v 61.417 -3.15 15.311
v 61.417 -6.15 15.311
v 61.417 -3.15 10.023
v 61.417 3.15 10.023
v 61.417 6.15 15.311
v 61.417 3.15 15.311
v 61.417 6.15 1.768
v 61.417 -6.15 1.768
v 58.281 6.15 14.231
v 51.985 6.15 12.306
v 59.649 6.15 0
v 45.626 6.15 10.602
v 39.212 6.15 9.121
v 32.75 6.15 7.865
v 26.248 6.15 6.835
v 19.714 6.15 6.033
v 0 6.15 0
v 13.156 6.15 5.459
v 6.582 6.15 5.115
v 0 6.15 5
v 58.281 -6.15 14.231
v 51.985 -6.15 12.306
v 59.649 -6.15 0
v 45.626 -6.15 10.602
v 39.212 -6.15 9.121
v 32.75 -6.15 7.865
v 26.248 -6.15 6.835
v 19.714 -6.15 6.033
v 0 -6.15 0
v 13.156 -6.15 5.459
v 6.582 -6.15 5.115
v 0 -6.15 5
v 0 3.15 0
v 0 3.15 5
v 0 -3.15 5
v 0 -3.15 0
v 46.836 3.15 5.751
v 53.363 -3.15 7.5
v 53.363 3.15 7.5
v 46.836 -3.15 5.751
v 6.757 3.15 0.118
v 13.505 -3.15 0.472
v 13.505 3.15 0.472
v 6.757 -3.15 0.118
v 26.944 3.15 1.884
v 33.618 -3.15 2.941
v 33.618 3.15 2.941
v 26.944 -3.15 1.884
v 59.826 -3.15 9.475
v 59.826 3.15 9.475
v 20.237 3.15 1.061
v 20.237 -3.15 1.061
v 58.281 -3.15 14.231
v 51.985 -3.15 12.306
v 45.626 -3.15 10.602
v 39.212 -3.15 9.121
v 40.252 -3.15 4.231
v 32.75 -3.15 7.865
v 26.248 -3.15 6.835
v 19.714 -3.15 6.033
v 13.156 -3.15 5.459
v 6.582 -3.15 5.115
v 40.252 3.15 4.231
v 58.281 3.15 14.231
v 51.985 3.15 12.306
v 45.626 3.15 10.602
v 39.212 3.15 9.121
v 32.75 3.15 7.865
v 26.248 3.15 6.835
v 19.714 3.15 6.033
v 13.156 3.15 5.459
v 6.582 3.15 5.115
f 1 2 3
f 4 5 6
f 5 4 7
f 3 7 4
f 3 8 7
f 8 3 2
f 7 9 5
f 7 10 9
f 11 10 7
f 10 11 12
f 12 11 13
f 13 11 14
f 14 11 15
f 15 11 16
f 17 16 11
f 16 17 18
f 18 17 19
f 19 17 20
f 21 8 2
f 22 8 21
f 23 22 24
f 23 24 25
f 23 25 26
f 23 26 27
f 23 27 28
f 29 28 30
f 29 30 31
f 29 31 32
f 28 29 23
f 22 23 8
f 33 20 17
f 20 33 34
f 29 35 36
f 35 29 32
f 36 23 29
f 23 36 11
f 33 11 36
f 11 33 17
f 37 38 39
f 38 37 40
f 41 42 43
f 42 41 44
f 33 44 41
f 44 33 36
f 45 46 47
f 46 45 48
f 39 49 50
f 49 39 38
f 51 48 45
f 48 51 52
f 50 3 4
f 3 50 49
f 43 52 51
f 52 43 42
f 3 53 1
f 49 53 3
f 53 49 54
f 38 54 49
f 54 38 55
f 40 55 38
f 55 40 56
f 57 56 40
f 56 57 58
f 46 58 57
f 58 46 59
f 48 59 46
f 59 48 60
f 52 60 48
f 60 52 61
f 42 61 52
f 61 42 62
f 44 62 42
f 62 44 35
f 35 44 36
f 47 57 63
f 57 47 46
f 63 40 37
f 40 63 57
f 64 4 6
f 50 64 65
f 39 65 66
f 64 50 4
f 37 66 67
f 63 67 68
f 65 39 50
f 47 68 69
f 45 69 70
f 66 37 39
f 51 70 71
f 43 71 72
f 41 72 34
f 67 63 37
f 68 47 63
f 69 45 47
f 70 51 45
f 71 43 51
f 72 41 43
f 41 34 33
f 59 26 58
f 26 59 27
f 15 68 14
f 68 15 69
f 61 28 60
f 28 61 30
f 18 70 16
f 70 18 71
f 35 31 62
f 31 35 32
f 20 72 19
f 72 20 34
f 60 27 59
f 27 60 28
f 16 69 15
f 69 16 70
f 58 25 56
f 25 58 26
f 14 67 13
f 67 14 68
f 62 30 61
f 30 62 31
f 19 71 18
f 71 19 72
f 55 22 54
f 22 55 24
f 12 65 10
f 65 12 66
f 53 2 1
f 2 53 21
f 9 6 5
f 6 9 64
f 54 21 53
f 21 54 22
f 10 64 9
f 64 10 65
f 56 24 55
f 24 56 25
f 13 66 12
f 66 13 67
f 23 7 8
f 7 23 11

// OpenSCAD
/* [Global] */

//Size of your spool (mm)
spool_radius = 193.6;

//Thickness of your spool's edge (mm)
spool_thickness = 6.3;

//How deep the clip will go in (mm)
clip_depth = 5;

//Length past the edge of the spool
clip_extend = 10;

//Thickness of the thinnest part of the clip (mm)
clip_thickness = 3;

//Remove sharp corner (causes overhang) 
clip_cut = true; //[true, false];

print_part();

module print_part() {
	
rotate(a=[-90,0,0])
translate([0,-spool_radius,0])
	difference(){
		//olor("yellow")
			translate([0,0,-(spool_thickness+(2*clip_thickness))/2])
				cube([sqrt(2*spool_radius*clip_extend - pow(clip_extend,2)), 
						spool_radius, 
						spool_thickness+(2*clip_thickness)]);

		//color("white")
		cylinder(r=spool_radius, h=spool_thickness, center=true, $fn=180);

		//color("gray")
			cylinder(r=spool_radius-clip_depth, h=spool_thickness+(2*clip_thickness)+1, center=true, $fn=180);

		if( clip_cut == true )
		//color("gray")
			translate([sqrt(2*spool_radius*clip_extend - pow(clip_extend,2)),spool_radius,0])
				rotate(a=[0,0,45])
					cube([clip_extend/4,clip_extend/4,spool_thickness+(2*clip_thickness)+1], center=true);
	}




}
